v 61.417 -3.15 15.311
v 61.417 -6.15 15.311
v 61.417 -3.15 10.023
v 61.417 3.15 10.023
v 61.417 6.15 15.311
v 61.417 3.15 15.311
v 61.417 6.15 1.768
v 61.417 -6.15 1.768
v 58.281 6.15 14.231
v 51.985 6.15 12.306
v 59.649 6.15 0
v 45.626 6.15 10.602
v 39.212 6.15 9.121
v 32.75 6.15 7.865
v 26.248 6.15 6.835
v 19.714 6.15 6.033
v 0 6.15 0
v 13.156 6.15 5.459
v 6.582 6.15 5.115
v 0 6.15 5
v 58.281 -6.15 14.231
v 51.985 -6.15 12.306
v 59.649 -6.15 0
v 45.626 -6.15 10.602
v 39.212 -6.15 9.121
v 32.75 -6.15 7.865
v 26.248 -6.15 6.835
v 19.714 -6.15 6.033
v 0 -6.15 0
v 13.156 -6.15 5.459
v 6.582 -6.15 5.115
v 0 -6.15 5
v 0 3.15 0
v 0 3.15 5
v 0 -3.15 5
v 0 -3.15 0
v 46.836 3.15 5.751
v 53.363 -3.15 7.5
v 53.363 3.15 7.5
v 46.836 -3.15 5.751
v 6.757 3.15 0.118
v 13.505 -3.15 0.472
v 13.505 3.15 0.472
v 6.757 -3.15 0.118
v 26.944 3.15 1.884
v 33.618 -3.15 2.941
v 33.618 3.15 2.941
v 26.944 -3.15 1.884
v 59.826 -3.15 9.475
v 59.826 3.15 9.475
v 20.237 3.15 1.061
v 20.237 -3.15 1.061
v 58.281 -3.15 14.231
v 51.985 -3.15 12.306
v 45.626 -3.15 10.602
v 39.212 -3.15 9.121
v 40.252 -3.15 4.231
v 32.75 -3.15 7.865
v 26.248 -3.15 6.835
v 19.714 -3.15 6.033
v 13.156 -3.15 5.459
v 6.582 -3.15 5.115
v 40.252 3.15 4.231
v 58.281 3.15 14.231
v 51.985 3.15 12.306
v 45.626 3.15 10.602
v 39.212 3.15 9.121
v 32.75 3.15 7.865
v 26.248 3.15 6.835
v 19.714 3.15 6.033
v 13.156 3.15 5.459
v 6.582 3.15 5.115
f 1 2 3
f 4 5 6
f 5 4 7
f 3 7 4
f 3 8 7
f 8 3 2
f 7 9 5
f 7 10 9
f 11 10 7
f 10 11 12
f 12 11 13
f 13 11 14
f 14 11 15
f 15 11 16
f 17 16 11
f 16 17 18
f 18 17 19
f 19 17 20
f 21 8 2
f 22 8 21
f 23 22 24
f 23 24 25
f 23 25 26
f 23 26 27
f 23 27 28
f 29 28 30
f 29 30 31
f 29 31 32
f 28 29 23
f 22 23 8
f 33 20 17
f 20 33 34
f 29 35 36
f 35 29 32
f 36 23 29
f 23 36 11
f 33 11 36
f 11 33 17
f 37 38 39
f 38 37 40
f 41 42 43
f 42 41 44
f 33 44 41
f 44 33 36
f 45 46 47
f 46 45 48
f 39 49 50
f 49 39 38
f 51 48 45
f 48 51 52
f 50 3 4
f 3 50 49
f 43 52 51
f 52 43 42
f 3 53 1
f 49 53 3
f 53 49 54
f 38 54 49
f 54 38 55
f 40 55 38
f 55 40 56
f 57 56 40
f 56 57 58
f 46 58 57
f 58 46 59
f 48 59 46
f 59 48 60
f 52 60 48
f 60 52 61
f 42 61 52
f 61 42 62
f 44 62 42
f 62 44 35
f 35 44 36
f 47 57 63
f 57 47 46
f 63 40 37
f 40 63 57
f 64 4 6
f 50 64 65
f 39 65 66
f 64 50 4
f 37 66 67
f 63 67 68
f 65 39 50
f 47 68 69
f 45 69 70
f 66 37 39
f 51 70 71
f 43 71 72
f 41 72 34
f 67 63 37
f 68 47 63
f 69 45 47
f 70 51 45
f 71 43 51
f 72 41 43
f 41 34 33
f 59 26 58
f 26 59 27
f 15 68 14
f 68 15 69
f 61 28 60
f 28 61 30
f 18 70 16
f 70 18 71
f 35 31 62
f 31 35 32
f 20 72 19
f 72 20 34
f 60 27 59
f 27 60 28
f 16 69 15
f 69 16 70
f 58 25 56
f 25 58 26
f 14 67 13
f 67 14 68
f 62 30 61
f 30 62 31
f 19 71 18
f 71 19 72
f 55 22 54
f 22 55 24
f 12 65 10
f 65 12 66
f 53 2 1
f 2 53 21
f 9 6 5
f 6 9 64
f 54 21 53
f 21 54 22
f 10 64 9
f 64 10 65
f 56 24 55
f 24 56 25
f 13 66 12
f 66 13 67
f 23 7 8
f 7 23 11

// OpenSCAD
/* [Global] */

//Size of your spool (mm)
spool_radius = 193.6;

//Thickness of your spool's edge (mm)
spool_thickness = 6.3;

//How deep the clip will go in (mm)
clip_depth = 5;

//Length past the edge of the spool
clip_extend = 10;

//Thickness of the thinnest part of the clip (mm)
clip_thickness = 3;

//Remove sharp corner (causes overhang) 
clip_cut = true; //[true, false];

print_part();

module print_part() {
	
rotate(a=[-90,0,0])
translate([0,-spool_radius,0])
	difference(){
		//olor("yellow")
			translate([0,0,-(spool_thickness+(2*clip_thickness))/2])
				cube([sqrt(2*spool_radius*clip_extend - pow(clip_extend,2)), 
						spool_radius, 
						spool_thickness+(2*clip_thickness)]);

		//color("white")
		cylinder(r=spool_radius, h=spool_thickness, center=true, $fn=180);

		//color("gray")
			cylinder(r=spool_radius-clip_depth, h=spool_thickness+(2*clip_thickness)+1, center=true, $fn=180);

		if( clip_cut == true )
		//color("gray")
			translate([sqrt(2*spool_radius*clip_extend - pow(clip_extend,2)),spool_radius,0])
				rotate(a=[0,0,45])
					cube([clip_extend/4,clip_extend/4,spool_thickness+(2*clip_thickness)+1], center=true);
	}




}
